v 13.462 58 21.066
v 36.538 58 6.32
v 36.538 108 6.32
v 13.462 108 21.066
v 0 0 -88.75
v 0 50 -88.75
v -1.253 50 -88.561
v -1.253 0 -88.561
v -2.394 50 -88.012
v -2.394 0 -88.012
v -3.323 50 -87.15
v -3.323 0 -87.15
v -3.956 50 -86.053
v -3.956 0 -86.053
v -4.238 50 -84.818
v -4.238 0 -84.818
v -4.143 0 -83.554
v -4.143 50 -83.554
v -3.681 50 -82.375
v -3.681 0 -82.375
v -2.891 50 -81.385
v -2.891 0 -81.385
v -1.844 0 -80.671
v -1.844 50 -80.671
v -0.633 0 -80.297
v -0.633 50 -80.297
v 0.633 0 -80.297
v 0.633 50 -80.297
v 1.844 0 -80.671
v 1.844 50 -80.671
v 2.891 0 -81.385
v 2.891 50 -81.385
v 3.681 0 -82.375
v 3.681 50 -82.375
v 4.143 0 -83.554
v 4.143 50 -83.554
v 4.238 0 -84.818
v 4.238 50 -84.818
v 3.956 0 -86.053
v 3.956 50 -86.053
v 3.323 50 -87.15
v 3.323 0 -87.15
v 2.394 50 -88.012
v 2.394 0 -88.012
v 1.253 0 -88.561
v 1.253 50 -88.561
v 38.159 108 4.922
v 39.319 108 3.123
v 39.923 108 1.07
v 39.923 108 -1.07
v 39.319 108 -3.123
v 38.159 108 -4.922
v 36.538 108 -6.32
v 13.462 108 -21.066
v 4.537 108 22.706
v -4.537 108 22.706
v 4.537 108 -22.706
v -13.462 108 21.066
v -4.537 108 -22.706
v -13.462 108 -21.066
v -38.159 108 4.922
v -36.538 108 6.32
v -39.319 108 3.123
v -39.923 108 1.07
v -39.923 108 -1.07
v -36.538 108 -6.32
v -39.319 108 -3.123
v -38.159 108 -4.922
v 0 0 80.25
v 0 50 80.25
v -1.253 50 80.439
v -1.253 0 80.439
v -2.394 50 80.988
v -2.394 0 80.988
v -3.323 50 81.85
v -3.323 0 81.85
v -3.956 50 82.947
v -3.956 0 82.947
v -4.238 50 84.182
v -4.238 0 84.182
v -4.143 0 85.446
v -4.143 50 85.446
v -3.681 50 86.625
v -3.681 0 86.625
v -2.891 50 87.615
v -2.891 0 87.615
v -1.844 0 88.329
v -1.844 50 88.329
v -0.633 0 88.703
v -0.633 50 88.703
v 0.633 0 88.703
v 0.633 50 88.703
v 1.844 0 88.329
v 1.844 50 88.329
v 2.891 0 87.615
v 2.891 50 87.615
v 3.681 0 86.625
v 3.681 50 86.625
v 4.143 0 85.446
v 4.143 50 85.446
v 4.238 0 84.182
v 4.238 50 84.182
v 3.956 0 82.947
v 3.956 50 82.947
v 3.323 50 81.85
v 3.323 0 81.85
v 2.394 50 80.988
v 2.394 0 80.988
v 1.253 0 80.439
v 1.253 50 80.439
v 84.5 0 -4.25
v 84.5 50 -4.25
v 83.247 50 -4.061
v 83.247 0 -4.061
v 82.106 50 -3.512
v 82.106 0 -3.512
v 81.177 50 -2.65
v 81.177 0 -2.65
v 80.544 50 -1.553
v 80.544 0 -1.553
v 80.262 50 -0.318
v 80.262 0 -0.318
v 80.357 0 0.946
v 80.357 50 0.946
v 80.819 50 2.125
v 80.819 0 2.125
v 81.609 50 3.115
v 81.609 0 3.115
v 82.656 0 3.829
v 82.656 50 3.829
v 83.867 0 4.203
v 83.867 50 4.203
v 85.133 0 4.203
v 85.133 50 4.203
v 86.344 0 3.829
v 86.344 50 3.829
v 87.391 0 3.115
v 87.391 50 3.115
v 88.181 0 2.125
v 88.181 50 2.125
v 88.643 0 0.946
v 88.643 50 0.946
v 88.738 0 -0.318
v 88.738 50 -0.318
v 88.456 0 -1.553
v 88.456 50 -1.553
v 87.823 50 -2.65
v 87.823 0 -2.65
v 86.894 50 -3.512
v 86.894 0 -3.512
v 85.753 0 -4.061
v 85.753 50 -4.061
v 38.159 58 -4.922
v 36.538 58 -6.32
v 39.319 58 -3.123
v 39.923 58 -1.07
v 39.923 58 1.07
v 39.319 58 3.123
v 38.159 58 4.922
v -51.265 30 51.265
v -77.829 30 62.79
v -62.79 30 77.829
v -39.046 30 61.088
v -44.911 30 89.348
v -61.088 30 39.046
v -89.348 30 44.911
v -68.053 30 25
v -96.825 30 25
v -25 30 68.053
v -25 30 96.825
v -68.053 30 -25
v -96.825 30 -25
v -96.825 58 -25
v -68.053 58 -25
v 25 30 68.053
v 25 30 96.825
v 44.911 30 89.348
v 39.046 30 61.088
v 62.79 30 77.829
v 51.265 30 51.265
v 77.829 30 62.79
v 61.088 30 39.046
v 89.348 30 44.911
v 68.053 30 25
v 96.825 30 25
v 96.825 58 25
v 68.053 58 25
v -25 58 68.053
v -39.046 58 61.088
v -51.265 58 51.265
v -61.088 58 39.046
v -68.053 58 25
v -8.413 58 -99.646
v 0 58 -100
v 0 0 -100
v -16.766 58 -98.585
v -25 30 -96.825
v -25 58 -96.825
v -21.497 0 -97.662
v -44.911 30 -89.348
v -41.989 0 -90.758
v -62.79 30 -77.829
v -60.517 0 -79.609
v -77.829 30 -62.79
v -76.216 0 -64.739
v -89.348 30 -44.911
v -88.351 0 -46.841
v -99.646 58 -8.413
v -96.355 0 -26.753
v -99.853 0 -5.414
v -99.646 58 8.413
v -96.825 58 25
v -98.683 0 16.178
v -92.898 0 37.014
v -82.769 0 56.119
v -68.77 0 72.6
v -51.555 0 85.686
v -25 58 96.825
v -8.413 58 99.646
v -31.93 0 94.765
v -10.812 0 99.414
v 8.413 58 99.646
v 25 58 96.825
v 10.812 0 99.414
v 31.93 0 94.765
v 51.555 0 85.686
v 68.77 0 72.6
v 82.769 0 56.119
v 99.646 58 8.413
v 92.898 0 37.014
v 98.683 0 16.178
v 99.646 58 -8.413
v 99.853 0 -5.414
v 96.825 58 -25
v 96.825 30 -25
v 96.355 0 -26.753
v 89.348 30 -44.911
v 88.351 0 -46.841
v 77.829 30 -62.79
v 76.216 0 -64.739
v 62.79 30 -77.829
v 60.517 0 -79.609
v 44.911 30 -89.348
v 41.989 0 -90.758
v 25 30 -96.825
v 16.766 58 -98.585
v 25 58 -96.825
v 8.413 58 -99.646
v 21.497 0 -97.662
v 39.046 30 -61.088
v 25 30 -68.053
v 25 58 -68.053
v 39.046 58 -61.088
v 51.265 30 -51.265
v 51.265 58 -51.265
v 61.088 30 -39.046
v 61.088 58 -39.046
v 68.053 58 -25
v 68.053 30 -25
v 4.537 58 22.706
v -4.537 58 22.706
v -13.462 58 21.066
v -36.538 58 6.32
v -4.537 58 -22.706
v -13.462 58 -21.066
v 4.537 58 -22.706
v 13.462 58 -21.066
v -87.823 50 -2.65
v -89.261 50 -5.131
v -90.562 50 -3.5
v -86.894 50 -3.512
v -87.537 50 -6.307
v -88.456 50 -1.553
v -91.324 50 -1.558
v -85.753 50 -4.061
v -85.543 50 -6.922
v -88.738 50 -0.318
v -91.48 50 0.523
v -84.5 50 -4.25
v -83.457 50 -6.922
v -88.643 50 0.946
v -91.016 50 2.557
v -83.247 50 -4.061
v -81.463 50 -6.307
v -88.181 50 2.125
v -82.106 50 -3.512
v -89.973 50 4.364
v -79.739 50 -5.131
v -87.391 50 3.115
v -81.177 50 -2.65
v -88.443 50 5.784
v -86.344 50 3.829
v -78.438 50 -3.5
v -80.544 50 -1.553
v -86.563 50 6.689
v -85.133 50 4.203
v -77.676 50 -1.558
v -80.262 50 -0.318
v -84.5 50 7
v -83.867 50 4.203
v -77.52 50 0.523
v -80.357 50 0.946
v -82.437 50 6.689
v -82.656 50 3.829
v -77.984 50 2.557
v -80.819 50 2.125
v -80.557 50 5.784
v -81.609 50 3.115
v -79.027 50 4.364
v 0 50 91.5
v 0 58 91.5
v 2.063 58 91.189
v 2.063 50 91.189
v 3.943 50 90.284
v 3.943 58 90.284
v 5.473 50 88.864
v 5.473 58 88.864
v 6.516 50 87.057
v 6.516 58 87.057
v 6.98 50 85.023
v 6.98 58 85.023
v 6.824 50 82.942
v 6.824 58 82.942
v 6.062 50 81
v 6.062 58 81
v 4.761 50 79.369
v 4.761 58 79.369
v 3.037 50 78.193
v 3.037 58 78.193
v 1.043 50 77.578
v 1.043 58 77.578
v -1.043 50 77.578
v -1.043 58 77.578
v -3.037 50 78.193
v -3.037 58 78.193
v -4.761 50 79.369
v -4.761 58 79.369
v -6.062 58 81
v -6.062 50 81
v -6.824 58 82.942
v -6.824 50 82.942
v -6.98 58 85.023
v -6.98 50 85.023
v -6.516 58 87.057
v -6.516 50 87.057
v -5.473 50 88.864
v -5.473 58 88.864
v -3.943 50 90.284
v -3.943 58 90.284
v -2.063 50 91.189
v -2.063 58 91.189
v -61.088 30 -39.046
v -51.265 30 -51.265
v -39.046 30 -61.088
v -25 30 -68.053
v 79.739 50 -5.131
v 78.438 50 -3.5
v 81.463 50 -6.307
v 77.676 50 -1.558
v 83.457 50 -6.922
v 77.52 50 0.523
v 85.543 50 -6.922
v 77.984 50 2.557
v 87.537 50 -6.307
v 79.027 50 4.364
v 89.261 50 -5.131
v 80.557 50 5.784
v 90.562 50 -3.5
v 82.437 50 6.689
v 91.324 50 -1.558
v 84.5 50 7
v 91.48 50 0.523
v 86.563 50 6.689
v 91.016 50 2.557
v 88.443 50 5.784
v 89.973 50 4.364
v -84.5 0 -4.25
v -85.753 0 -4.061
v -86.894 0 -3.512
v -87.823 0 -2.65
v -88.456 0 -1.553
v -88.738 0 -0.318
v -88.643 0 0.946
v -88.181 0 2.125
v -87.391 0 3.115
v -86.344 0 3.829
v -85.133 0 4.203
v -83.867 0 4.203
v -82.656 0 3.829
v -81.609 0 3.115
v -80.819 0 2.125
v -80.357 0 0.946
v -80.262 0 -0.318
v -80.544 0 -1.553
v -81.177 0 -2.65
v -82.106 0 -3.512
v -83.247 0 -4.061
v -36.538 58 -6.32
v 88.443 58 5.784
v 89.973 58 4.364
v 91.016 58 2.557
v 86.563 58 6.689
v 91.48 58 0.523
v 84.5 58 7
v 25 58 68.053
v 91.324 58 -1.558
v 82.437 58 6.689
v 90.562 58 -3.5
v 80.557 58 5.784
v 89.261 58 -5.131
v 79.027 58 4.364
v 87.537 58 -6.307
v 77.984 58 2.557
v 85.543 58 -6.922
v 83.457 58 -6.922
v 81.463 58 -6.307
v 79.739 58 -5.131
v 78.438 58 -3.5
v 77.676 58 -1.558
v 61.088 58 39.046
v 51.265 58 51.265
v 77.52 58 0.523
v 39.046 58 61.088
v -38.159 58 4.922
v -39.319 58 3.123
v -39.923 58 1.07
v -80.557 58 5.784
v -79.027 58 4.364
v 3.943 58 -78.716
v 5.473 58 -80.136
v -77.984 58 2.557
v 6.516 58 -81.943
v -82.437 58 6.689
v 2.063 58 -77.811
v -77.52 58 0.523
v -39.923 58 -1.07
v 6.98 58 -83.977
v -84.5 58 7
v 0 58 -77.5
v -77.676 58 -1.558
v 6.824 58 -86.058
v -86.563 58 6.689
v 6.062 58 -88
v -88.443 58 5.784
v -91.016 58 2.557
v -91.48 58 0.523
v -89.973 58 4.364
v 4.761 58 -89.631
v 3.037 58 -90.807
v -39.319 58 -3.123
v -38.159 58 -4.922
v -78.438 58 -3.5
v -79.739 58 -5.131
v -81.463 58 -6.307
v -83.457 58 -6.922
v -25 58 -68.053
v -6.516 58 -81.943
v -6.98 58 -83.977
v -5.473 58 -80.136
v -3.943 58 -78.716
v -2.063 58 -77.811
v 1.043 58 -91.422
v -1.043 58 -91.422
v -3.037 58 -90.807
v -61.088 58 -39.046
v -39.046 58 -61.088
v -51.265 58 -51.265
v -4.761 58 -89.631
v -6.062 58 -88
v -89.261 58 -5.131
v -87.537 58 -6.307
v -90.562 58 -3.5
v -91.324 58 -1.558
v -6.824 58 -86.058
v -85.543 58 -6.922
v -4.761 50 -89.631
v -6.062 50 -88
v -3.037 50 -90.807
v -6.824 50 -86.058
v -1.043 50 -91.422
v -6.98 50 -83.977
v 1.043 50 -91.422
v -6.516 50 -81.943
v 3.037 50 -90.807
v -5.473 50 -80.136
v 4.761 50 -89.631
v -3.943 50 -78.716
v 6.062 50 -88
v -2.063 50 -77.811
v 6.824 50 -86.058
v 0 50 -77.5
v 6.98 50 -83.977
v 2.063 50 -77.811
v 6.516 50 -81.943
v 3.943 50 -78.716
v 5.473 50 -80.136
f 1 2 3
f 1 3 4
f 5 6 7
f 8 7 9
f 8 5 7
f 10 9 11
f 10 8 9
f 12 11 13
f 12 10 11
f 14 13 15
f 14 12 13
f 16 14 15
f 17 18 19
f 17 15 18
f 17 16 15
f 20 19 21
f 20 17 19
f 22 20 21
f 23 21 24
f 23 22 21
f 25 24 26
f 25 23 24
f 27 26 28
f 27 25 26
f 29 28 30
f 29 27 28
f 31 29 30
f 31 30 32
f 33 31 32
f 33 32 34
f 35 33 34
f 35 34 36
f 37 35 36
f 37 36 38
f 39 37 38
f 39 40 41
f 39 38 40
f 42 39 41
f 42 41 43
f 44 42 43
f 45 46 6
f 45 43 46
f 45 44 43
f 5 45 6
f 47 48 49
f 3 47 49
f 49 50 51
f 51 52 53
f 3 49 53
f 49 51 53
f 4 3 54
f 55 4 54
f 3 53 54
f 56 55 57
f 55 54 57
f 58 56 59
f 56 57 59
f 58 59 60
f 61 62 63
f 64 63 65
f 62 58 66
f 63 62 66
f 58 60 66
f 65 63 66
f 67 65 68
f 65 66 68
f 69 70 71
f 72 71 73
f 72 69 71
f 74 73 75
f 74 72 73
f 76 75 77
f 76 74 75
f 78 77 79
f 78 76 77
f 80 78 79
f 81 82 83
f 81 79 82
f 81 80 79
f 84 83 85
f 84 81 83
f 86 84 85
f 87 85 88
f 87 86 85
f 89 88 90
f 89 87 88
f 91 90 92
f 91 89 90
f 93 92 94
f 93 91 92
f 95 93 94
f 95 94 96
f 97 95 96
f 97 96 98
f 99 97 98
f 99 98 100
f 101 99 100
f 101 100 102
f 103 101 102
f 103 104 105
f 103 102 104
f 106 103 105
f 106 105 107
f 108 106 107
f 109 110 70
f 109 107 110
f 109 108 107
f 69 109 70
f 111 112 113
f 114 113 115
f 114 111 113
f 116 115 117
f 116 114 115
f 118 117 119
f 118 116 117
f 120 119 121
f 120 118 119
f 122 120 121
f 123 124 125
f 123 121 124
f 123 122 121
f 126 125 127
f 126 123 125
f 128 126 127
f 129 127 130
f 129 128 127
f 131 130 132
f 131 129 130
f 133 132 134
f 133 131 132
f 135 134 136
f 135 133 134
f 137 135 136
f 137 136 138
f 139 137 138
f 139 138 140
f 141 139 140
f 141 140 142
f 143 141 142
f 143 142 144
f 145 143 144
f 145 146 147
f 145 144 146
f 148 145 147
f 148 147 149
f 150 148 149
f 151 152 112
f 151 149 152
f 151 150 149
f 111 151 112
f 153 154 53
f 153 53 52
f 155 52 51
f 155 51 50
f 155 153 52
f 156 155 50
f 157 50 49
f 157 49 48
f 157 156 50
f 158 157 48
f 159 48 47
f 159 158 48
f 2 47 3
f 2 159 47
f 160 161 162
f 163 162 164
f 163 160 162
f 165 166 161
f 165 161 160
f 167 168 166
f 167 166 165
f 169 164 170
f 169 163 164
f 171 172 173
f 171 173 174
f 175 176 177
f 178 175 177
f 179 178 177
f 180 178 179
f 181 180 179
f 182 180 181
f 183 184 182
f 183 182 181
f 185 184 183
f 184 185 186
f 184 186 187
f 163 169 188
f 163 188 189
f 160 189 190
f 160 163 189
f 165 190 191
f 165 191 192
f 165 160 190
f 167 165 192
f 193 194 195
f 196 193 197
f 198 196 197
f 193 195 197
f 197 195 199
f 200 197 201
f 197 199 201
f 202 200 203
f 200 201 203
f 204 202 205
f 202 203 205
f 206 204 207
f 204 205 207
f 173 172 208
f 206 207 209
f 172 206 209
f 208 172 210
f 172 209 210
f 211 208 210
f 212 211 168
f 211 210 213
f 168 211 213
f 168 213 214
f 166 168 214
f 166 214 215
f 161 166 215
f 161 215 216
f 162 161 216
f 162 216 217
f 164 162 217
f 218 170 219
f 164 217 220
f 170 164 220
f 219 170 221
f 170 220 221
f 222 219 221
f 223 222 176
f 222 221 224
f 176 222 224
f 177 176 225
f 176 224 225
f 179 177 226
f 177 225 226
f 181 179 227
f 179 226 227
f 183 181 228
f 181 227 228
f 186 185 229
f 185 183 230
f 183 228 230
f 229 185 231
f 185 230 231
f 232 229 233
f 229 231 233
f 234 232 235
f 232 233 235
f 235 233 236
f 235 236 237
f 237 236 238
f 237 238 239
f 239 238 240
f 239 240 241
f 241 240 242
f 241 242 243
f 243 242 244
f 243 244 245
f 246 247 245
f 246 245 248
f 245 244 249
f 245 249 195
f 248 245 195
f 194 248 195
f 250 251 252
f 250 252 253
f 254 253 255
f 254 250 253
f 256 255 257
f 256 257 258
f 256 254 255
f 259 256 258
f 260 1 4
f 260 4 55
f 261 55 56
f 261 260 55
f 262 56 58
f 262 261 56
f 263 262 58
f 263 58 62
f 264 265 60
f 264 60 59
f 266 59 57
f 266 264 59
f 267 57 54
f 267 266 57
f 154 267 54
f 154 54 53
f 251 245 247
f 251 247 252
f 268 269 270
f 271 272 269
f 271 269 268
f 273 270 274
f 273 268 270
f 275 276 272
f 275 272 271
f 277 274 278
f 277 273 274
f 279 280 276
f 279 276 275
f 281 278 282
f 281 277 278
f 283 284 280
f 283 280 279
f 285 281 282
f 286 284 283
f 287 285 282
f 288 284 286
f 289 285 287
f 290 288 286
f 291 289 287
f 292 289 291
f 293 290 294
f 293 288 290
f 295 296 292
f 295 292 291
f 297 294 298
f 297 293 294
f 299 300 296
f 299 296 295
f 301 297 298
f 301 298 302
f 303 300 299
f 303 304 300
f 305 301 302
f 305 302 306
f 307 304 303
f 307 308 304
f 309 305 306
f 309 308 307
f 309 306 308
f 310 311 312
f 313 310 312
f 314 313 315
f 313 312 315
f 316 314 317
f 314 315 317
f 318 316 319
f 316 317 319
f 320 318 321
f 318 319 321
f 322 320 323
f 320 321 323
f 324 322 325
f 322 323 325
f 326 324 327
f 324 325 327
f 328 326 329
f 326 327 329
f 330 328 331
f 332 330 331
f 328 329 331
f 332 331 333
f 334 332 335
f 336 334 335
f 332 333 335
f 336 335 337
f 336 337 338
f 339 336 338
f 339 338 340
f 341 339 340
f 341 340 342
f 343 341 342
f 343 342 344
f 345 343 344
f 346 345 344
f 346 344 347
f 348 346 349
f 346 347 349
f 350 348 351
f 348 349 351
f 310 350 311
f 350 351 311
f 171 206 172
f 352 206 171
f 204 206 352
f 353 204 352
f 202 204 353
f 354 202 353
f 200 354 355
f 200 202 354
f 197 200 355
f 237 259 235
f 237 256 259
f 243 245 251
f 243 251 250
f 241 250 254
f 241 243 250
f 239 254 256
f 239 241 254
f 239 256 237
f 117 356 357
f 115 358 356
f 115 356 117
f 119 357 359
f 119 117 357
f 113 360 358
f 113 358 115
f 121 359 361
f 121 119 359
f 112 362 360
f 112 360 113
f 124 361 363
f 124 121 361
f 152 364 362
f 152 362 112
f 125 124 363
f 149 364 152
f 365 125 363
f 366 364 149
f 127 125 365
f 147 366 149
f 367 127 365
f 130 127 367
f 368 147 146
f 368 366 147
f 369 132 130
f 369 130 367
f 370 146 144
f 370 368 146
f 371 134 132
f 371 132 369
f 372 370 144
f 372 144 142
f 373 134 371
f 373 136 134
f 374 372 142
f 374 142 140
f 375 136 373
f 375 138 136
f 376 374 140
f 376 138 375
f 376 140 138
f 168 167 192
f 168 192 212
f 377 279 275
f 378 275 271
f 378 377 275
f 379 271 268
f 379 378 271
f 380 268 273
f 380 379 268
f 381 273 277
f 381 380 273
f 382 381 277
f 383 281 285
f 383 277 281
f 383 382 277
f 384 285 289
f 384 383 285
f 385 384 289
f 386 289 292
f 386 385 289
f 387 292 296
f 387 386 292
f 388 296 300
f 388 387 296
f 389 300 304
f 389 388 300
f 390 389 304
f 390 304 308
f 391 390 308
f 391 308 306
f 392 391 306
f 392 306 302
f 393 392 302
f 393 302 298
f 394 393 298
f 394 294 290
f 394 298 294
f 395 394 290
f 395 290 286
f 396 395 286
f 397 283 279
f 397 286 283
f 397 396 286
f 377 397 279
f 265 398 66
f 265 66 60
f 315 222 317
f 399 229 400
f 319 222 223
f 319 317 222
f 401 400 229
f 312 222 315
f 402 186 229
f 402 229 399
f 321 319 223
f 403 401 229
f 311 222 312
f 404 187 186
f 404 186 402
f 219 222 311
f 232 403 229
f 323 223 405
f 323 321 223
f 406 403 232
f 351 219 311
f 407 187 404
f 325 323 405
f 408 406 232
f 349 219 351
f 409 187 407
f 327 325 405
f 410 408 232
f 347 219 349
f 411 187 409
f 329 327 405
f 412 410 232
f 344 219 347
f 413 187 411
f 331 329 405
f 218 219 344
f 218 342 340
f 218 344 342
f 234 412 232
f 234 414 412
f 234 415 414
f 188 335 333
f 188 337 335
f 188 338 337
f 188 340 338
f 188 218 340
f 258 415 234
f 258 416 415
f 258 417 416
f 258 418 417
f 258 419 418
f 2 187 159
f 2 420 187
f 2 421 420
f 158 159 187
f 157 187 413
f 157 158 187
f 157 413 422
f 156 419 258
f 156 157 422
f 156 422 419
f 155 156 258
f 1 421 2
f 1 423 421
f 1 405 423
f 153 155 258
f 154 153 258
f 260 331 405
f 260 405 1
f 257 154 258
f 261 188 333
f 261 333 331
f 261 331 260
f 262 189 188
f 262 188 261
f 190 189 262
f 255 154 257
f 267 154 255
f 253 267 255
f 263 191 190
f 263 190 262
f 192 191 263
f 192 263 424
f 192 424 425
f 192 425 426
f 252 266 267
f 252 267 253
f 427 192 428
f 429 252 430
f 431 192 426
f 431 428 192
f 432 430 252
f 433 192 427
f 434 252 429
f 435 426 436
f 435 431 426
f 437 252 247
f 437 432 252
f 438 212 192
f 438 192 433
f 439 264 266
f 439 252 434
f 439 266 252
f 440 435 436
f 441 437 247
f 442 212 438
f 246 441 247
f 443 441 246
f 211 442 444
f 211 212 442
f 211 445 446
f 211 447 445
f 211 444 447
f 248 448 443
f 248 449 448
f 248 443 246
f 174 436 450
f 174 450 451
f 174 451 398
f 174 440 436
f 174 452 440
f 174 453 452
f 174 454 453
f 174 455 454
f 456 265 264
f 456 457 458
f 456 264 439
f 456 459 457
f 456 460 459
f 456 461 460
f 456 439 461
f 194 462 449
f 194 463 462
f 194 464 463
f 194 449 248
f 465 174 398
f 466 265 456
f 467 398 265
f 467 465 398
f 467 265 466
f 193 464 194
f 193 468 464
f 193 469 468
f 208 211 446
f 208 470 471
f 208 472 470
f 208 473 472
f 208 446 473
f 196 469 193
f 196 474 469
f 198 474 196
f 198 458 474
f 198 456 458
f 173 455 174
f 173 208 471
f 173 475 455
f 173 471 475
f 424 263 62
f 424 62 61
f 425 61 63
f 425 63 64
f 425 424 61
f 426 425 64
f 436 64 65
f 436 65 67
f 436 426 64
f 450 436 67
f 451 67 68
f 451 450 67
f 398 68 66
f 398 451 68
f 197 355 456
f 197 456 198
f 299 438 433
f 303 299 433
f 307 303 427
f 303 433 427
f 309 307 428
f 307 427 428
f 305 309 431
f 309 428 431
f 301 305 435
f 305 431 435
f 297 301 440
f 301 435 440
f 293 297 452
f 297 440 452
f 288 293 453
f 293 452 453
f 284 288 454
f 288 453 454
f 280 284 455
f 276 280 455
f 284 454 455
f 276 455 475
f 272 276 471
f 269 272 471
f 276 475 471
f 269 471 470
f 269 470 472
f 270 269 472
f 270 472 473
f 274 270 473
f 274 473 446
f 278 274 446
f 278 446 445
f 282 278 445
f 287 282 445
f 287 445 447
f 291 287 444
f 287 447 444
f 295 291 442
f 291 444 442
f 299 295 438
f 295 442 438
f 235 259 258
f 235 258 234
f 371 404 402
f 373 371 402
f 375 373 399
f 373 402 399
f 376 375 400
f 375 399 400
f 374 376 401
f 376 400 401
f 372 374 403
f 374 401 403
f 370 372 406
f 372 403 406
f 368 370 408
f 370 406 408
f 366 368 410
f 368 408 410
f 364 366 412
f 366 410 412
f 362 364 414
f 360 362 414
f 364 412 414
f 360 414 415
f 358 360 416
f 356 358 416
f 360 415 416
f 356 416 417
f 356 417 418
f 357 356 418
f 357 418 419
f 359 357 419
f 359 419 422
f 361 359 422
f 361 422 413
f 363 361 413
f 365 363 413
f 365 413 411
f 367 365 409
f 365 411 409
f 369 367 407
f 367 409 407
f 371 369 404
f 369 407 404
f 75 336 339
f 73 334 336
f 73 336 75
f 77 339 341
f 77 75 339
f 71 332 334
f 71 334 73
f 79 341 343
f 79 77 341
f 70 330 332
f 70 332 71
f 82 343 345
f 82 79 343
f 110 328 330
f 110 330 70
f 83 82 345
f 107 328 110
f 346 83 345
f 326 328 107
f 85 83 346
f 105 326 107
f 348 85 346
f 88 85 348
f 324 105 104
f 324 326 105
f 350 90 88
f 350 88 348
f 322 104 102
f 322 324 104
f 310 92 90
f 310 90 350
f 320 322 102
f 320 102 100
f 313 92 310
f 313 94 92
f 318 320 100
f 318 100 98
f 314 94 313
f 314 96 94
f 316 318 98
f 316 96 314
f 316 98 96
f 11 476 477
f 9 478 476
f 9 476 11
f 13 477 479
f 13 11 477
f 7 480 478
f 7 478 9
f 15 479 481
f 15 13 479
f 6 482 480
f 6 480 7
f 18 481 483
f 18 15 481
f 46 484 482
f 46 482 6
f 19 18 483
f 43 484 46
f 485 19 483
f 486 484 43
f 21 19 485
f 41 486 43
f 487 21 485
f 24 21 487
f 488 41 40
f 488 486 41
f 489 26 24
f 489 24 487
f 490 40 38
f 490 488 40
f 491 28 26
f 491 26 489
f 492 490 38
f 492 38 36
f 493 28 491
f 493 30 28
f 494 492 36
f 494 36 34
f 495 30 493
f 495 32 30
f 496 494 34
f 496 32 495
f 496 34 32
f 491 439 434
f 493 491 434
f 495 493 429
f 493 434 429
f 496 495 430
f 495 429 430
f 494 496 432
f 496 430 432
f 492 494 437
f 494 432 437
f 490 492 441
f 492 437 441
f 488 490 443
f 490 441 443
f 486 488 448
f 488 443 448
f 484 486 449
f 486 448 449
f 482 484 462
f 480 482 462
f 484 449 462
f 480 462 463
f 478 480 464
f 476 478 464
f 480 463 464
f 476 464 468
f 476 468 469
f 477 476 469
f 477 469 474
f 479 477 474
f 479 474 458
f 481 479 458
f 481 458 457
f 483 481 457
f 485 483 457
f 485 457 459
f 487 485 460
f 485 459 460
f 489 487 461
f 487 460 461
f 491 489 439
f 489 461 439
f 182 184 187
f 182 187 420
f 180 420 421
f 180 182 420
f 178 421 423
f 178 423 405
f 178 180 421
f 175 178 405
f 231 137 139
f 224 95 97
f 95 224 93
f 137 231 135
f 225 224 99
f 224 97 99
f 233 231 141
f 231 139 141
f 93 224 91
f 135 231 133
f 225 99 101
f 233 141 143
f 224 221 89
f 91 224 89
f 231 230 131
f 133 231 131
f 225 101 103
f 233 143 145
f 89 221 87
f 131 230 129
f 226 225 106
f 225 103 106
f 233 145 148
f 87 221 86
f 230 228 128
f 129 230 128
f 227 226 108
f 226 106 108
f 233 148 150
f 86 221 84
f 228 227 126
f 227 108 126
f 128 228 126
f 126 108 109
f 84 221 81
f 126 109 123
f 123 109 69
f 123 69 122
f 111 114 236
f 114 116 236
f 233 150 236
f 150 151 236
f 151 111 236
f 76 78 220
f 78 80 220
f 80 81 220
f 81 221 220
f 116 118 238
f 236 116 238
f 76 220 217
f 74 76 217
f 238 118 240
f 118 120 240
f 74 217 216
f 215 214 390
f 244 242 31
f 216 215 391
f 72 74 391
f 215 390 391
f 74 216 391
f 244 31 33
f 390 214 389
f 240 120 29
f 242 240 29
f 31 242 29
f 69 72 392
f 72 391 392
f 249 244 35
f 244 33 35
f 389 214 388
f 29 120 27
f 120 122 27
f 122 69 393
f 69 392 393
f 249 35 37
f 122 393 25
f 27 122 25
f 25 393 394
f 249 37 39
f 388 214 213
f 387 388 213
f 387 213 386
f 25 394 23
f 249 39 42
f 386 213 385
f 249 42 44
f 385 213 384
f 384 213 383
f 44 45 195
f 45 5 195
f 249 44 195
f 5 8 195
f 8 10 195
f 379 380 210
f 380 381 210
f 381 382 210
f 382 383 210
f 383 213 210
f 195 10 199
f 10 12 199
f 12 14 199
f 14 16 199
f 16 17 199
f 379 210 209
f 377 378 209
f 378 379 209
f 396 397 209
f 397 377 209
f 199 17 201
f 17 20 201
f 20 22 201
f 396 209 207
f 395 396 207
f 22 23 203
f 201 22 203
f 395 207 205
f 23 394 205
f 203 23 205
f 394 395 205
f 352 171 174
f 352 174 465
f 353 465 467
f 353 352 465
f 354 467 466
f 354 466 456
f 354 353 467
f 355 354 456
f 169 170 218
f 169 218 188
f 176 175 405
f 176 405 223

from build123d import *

# Parameters (mm, degrees)
SKETCH2_R           = 100
SKETCH2_R_2         = 4.25
BOSS_EXTRUDE1_DEPTH = 58
SKETCH3_R           = 7
CUT_EXTRUDE1_DEPTH  = 8
CUT_EXTRUDE2_START  = -28
CUT_EXTRUDE2_DEPTH  = 28
BOSS_EXTRUDE2_DEPTH = 50


with BuildPart() as part:
    # Sketch2 → Boss-Extrude1 (new body)
    with BuildSketch(Plane(origin=(0, 0, 0), x_dir=(1, 0, 0), z_dir=(0, 1, 0))):
        with Locations(Location((0, 0, 0), (0, 0, 90))):
            Circle(SKETCH2_R)
        with Locations(Location((0, 84.5, 0), (0, 0, 90))):
            Circle(SKETCH2_R_2, mode=Mode.SUBTRACT)
        with Locations(Location((84.5, 0, 0), (0, 0, 90))):
            Circle(SKETCH2_R_2, mode=Mode.SUBTRACT)
        with Locations(Location((0, -84.5, 0), (0, 0, 90))):
            Circle(SKETCH2_R_2, mode=Mode.SUBTRACT)
        with Locations(Location((-84.5, 0, 0), (0, 0, 90))):
            Circle(SKETCH2_R_2, mode=Mode.SUBTRACT)
    extrude(amount=BOSS_EXTRUDE1_DEPTH)

    # Sketch3 → Cut-Extrude1 (cut)
    with BuildSketch(Plane(origin=(0, 58, 0), x_dir=(1, 0, 0), z_dir=(0, 1, 0))):
        with Locations(Location((0, 84.5, 0), (0, 0, 270))):
            Circle(SKETCH3_R)
        with Locations(Location((84.5, 0, 0), (0, 0, 270))):
            Circle(SKETCH3_R)
        with Locations(Location((0, -84.5, 0), (0, 0, 270))):
            Circle(SKETCH3_R)
        with Locations(Location((-84.5, 0, 0), (0, 0, 270))):
            Circle(SKETCH3_R)
    extrude(amount=-CUT_EXTRUDE1_DEPTH, mode=Mode.SUBTRACT)

    # Sketch4 → Cut-Extrude2 (cut)
    with BuildSketch(Plane(origin=(0, 58, 0), x_dir=(1, 0, 0), z_dir=(0, 1, 0)).offset(CUT_EXTRUDE2_START)):
        with BuildLine():
            Line((-25, 68.053287944), (-25, 96.824583655))
            ThreePointArc((-25, 96.824583655), (-70.710678119, 70.710678119), (-96.824583655, 25))
            Line((-96.824583655, 25), (-68.053287944, 25))
            ThreePointArc((-68.053287944, 25), (-51.265241636, 51.265241636), (-25, 68.053287944))
        make_face()
        with BuildLine():
            Line((68.053287944, 25), (96.824583655, 25))
            ThreePointArc((96.824583655, 25), (70.710678119, 70.710678119), (25, 96.824583655))
            Line((25, 96.824583655), (25, 68.053287944))
            ThreePointArc((25, 68.053287944), (51.265241636, 51.265241636), (68.053287944, 25))
        make_face()
        with BuildLine():
            ThreePointArc((25, -96.824583655), (70.710678119, -70.710678119), (96.824583655, -25))
            Line((96.824583655, -25), (68.053287944, -25))
            ThreePointArc((68.053287944, -25), (51.265241636, -51.265241636), (25, -68.053287944))
            Line((25, -68.053287944), (25, -96.824583655))
        make_face()
        with BuildLine():
            ThreePointArc((-96.824583655, -25), (-70.710678119, -70.710678119), (-25, -96.824583655))
            Line((-25, -96.824583655), (-25, -68.053287944))
            ThreePointArc((-25, -68.053287944), (-51.265241636, -51.265241636), (-68.053287944, -25))
            Line((-68.053287944, -25), (-68.372754715, -25))
            Line((-68.372754715, -25), (-96.824583655, -25))
        make_face()
    extrude(amount=CUT_EXTRUDE2_DEPTH, mode=Mode.SUBTRACT)

    # Sketch5 → Boss-Extrude2 (add)
    with BuildSketch(Plane(origin=(0, 58, 0), x_dir=(1, 0, 0), z_dir=(0, 1, 0))):
        with BuildLine():
            Line((-36.538461538, 6.319875664), (-13.461538462, 21.066252212))
            ThreePointArc((-13.461538462, 21.066252212), (0, 22.912467498), (13.461538462, 21.066252212))
            Line((13.461538462, 21.066252212), (36.538461538, 6.319875664))
            ThreePointArc((36.538461538, 6.319875664), (40, 0), (36.538461538, -6.319875664))
            Line((36.538461538, -6.319875664), (13.461538462, -21.066252212))
            ThreePointArc((13.461538462, -21.066252212), (0, -22.912467498), (-13.461538462, -21.066252212))
            Line((-13.461538462, -21.066252212), (-36.538461538, -6.319875664))
            ThreePointArc((-36.538461538, -6.319875664), (-40, 0), (-36.538461538, 6.319875664))
        make_face()
    extrude(amount=BOSS_EXTRUDE2_DEPTH)


solid = part.part
